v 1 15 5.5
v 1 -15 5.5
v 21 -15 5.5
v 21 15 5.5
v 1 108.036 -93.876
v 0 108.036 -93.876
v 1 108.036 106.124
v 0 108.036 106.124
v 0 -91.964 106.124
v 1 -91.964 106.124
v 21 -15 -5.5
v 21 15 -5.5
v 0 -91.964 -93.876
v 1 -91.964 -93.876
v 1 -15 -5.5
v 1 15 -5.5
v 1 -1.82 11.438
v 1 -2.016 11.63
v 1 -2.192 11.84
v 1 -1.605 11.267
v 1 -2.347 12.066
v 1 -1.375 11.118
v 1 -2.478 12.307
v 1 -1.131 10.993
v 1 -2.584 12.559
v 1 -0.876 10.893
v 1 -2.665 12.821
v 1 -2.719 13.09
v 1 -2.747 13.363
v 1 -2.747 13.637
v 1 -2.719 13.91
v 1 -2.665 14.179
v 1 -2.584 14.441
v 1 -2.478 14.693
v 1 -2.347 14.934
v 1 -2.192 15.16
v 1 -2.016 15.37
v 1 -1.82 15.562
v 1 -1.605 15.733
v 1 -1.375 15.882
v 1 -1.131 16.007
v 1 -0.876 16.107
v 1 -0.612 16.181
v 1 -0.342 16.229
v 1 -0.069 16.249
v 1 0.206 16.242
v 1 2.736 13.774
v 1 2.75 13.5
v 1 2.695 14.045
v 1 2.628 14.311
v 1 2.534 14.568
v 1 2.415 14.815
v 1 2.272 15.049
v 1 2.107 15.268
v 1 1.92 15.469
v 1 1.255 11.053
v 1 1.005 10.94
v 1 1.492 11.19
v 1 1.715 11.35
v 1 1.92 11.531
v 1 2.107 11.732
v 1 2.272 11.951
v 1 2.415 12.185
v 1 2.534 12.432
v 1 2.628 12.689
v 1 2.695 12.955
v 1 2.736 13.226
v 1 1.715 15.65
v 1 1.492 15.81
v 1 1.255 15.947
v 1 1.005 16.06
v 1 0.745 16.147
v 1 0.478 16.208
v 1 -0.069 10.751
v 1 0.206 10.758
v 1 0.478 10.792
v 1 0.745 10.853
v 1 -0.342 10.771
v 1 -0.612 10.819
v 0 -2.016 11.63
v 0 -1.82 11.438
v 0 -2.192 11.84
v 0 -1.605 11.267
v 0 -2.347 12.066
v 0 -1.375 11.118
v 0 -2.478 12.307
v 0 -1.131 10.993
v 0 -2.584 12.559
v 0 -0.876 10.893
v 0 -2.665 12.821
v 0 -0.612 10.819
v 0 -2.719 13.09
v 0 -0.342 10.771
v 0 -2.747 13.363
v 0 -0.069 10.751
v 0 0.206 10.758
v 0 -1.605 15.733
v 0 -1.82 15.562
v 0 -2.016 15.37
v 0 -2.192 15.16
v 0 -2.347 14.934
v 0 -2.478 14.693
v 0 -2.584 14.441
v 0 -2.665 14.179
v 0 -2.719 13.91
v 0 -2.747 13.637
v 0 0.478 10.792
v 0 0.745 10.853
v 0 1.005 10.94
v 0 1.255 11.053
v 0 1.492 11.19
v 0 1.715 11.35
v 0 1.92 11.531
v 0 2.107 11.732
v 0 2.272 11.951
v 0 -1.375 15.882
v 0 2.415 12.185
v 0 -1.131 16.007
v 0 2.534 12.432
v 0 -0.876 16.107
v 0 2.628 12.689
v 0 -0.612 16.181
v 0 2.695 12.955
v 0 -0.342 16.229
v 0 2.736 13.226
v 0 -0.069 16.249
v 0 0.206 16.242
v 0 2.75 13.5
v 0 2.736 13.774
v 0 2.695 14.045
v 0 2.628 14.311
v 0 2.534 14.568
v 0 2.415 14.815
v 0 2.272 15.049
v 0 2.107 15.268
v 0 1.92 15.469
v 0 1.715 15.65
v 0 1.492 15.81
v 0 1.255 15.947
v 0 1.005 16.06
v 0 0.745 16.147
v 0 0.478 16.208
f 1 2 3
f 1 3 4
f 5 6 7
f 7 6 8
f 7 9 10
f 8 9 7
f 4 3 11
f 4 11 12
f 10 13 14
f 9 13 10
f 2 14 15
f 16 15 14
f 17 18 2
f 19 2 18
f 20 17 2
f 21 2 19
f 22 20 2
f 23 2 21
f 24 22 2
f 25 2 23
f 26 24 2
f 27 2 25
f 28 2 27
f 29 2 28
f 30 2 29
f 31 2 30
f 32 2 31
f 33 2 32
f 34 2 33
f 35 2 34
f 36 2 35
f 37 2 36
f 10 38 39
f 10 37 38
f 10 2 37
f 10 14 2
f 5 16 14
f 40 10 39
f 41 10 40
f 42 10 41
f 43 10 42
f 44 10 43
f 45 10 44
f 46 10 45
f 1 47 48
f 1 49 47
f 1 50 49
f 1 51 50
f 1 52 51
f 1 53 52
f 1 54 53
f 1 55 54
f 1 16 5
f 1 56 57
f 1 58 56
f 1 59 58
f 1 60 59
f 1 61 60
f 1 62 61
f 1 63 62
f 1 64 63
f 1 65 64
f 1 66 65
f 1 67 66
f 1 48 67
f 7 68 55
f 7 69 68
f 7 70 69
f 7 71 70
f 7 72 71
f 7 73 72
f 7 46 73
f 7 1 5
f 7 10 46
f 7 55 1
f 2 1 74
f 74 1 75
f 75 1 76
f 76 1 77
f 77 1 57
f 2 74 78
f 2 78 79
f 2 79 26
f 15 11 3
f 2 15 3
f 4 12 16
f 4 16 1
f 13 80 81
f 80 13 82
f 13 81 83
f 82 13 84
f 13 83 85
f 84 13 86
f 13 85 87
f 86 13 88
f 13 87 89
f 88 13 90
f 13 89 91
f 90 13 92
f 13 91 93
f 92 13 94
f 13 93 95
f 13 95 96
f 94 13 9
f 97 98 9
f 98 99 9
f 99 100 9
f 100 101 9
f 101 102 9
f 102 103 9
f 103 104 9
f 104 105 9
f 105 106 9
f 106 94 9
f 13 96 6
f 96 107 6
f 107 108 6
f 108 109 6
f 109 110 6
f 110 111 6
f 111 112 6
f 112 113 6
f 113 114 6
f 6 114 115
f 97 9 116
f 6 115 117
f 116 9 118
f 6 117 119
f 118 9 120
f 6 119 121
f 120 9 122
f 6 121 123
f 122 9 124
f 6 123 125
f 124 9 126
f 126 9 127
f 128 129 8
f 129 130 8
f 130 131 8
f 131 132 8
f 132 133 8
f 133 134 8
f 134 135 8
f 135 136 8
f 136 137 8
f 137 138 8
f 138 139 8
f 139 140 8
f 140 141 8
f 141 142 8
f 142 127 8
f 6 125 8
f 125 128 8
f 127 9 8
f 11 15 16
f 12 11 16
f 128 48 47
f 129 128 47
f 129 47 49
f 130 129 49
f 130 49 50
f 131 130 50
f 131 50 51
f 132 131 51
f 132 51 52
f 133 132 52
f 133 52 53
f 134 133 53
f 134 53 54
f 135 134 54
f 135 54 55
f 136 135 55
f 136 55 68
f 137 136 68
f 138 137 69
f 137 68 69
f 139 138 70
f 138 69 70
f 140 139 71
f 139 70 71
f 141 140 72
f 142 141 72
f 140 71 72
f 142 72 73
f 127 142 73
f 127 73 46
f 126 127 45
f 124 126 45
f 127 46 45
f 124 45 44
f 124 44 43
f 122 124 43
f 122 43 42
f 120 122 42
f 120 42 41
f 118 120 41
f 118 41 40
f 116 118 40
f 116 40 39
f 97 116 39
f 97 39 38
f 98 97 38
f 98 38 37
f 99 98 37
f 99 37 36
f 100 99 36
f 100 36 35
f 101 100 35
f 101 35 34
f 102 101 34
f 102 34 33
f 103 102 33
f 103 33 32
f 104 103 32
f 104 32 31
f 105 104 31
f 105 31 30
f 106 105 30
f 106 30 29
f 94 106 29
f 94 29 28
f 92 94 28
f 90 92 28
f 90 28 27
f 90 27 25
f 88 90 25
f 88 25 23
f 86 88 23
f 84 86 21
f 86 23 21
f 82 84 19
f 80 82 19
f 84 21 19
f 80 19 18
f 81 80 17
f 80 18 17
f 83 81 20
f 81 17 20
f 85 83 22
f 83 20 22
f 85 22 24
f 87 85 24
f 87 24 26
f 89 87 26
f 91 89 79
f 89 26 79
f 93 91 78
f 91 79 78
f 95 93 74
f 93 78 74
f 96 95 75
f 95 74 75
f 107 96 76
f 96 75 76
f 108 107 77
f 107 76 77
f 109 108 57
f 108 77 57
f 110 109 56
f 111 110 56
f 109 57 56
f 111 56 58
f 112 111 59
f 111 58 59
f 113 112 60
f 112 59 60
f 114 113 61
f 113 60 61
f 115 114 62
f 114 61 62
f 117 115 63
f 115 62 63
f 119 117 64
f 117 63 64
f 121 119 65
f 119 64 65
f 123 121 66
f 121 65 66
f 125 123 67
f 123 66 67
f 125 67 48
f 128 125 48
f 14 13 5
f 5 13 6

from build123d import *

# Parameters (mm, degrees)
F0_W     = 200
F0_H     = 200
F1_DEPTH = 1
F2_W     = 30
F2_H     = 11
F3_DEPTH = 20
F4_R     = 2.75
F5_DEPTH = 25


with BuildPart() as f1:
    # F0 (on Right) → F1 (new body)
    with BuildSketch(Plane.YZ):
        with Locations((8.036284, 6.124369)):
            Rectangle(F0_W, F0_H)
    extrude(amount=F1_DEPTH)

    # F2 (on face) → F3 (join)
    with BuildSketch(Plane.YZ.offset(1)):
        Rectangle(F2_W, F2_H)
    extrude(amount=F3_DEPTH)

    # F4 (on face) → F5 (cut)
    with BuildSketch(Plane.YZ.offset(1)):
        with Locations((0, 13.5)):
            Circle(F4_R)
    extrude(amount=-F5_DEPTH, mode=Mode.SUBTRACT)


solid = f1.part
